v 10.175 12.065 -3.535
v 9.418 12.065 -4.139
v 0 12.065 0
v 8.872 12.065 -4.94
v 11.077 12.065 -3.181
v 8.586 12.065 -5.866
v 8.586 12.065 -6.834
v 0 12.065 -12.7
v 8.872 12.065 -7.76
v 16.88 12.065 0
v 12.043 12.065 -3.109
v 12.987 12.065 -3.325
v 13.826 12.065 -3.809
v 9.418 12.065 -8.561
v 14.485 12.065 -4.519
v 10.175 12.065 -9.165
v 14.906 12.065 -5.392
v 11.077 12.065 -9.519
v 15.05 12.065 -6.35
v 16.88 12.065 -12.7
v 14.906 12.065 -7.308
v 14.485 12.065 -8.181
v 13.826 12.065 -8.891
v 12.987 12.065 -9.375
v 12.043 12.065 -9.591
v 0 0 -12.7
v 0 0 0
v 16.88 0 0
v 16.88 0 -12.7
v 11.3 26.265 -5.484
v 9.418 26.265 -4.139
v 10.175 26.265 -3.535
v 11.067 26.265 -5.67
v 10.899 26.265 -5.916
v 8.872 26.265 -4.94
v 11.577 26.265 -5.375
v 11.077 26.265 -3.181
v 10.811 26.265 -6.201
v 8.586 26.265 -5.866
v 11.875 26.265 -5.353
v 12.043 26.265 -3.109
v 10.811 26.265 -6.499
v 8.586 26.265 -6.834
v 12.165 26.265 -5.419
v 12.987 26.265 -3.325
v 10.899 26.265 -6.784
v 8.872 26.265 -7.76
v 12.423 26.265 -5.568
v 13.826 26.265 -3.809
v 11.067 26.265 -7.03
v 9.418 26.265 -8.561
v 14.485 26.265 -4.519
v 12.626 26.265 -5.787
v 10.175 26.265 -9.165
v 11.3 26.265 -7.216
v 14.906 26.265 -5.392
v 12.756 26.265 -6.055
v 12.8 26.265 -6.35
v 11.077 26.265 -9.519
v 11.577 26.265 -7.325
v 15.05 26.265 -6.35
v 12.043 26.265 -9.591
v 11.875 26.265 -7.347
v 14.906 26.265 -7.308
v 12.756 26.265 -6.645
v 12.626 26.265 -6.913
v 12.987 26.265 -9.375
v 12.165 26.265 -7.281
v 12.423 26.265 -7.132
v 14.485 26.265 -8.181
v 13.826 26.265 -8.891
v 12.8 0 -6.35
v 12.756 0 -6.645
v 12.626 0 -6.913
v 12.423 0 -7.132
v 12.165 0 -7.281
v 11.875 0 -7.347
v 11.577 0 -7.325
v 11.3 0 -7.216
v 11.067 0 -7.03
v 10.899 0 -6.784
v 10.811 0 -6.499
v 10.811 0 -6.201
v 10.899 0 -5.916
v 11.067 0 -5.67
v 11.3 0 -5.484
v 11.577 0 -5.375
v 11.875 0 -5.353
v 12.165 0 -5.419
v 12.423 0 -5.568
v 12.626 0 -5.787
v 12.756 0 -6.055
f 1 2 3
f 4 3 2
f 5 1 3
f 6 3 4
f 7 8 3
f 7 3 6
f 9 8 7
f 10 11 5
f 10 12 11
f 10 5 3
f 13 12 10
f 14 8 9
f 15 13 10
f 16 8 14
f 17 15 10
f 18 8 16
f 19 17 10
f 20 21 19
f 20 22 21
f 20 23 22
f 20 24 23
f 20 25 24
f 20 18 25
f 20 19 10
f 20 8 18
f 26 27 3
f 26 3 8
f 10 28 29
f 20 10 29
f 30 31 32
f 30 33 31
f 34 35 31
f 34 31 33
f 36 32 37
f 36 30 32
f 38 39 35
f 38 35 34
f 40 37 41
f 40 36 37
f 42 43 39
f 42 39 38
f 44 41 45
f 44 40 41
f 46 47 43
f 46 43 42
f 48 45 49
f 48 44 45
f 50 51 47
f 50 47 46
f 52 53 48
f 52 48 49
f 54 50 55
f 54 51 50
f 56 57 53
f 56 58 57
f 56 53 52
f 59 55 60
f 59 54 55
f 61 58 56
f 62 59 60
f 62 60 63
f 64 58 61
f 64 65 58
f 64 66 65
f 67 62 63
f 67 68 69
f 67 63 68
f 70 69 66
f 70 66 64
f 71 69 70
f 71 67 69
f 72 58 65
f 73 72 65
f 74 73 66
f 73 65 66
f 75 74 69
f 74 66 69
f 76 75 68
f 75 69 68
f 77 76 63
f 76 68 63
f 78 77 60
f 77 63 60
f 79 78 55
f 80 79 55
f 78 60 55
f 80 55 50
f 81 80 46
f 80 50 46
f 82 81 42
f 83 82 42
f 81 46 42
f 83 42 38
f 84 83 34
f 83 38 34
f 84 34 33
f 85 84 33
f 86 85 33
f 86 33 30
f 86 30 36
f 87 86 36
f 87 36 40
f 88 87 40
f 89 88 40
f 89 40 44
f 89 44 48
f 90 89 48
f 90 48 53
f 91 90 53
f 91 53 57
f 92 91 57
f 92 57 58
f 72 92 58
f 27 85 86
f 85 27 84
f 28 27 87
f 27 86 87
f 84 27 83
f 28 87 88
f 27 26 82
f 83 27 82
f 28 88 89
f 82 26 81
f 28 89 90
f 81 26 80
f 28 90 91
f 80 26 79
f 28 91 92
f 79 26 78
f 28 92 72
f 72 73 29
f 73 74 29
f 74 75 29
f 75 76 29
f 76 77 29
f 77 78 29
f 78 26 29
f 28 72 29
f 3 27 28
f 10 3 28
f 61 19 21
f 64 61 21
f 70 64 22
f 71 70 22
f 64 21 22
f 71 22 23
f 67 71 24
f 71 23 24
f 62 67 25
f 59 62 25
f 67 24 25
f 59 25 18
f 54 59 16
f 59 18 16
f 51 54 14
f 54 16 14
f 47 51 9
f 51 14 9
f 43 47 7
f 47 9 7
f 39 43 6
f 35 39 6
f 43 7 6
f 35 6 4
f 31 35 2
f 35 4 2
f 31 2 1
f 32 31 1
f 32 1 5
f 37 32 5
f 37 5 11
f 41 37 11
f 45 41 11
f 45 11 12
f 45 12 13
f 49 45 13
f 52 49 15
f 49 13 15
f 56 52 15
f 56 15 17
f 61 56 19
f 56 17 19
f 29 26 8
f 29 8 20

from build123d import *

# Parameters (mm, degrees)
SKETCH1_W           = 16.88
SKETCH1_H           = 12.7
BOSS_EXTRUDE1_DEPTH = 12.065
SKETCH3_R           = 3.25
BOSS_EXTRUDE2_DEPTH = 14.2
SKETCH4_R           = 1
CUT_EXTRUDE1_DEPTH  = 27.265


with BuildPart() as part:
    # Sketch1 → Boss-Extrude1 (new body)
    with BuildSketch(Plane(origin=(0, 0, 0), x_dir=(1, 0, 0), z_dir=(0, 1, 0))):
        with Locations((8.44, 6.35)):
            Rectangle(SKETCH1_W, SKETCH1_H)
    extrude(amount=BOSS_EXTRUDE1_DEPTH)

    # Sketch3 → Boss-Extrude2 (add)
    with BuildSketch(Plane(origin=(0, 12.065, 0), x_dir=(1, 0, 0), z_dir=(0, 1, 0))):
        with Locations((11.8, 6.35)):
            Circle(SKETCH3_R)
    extrude(amount=BOSS_EXTRUDE2_DEPTH)

    # Sketch4 → Cut-Extrude1 (cut, through all)
    with BuildSketch(Plane(origin=(0, 26.265, 0), x_dir=(1, 0, 0), z_dir=(0, 1, 0))):
        with Locations((11.8, 6.35)):
            Circle(SKETCH4_R)
    extrude(amount=-CUT_EXTRUDE1_DEPTH, mode=Mode.SUBTRACT)


solid = part.part
